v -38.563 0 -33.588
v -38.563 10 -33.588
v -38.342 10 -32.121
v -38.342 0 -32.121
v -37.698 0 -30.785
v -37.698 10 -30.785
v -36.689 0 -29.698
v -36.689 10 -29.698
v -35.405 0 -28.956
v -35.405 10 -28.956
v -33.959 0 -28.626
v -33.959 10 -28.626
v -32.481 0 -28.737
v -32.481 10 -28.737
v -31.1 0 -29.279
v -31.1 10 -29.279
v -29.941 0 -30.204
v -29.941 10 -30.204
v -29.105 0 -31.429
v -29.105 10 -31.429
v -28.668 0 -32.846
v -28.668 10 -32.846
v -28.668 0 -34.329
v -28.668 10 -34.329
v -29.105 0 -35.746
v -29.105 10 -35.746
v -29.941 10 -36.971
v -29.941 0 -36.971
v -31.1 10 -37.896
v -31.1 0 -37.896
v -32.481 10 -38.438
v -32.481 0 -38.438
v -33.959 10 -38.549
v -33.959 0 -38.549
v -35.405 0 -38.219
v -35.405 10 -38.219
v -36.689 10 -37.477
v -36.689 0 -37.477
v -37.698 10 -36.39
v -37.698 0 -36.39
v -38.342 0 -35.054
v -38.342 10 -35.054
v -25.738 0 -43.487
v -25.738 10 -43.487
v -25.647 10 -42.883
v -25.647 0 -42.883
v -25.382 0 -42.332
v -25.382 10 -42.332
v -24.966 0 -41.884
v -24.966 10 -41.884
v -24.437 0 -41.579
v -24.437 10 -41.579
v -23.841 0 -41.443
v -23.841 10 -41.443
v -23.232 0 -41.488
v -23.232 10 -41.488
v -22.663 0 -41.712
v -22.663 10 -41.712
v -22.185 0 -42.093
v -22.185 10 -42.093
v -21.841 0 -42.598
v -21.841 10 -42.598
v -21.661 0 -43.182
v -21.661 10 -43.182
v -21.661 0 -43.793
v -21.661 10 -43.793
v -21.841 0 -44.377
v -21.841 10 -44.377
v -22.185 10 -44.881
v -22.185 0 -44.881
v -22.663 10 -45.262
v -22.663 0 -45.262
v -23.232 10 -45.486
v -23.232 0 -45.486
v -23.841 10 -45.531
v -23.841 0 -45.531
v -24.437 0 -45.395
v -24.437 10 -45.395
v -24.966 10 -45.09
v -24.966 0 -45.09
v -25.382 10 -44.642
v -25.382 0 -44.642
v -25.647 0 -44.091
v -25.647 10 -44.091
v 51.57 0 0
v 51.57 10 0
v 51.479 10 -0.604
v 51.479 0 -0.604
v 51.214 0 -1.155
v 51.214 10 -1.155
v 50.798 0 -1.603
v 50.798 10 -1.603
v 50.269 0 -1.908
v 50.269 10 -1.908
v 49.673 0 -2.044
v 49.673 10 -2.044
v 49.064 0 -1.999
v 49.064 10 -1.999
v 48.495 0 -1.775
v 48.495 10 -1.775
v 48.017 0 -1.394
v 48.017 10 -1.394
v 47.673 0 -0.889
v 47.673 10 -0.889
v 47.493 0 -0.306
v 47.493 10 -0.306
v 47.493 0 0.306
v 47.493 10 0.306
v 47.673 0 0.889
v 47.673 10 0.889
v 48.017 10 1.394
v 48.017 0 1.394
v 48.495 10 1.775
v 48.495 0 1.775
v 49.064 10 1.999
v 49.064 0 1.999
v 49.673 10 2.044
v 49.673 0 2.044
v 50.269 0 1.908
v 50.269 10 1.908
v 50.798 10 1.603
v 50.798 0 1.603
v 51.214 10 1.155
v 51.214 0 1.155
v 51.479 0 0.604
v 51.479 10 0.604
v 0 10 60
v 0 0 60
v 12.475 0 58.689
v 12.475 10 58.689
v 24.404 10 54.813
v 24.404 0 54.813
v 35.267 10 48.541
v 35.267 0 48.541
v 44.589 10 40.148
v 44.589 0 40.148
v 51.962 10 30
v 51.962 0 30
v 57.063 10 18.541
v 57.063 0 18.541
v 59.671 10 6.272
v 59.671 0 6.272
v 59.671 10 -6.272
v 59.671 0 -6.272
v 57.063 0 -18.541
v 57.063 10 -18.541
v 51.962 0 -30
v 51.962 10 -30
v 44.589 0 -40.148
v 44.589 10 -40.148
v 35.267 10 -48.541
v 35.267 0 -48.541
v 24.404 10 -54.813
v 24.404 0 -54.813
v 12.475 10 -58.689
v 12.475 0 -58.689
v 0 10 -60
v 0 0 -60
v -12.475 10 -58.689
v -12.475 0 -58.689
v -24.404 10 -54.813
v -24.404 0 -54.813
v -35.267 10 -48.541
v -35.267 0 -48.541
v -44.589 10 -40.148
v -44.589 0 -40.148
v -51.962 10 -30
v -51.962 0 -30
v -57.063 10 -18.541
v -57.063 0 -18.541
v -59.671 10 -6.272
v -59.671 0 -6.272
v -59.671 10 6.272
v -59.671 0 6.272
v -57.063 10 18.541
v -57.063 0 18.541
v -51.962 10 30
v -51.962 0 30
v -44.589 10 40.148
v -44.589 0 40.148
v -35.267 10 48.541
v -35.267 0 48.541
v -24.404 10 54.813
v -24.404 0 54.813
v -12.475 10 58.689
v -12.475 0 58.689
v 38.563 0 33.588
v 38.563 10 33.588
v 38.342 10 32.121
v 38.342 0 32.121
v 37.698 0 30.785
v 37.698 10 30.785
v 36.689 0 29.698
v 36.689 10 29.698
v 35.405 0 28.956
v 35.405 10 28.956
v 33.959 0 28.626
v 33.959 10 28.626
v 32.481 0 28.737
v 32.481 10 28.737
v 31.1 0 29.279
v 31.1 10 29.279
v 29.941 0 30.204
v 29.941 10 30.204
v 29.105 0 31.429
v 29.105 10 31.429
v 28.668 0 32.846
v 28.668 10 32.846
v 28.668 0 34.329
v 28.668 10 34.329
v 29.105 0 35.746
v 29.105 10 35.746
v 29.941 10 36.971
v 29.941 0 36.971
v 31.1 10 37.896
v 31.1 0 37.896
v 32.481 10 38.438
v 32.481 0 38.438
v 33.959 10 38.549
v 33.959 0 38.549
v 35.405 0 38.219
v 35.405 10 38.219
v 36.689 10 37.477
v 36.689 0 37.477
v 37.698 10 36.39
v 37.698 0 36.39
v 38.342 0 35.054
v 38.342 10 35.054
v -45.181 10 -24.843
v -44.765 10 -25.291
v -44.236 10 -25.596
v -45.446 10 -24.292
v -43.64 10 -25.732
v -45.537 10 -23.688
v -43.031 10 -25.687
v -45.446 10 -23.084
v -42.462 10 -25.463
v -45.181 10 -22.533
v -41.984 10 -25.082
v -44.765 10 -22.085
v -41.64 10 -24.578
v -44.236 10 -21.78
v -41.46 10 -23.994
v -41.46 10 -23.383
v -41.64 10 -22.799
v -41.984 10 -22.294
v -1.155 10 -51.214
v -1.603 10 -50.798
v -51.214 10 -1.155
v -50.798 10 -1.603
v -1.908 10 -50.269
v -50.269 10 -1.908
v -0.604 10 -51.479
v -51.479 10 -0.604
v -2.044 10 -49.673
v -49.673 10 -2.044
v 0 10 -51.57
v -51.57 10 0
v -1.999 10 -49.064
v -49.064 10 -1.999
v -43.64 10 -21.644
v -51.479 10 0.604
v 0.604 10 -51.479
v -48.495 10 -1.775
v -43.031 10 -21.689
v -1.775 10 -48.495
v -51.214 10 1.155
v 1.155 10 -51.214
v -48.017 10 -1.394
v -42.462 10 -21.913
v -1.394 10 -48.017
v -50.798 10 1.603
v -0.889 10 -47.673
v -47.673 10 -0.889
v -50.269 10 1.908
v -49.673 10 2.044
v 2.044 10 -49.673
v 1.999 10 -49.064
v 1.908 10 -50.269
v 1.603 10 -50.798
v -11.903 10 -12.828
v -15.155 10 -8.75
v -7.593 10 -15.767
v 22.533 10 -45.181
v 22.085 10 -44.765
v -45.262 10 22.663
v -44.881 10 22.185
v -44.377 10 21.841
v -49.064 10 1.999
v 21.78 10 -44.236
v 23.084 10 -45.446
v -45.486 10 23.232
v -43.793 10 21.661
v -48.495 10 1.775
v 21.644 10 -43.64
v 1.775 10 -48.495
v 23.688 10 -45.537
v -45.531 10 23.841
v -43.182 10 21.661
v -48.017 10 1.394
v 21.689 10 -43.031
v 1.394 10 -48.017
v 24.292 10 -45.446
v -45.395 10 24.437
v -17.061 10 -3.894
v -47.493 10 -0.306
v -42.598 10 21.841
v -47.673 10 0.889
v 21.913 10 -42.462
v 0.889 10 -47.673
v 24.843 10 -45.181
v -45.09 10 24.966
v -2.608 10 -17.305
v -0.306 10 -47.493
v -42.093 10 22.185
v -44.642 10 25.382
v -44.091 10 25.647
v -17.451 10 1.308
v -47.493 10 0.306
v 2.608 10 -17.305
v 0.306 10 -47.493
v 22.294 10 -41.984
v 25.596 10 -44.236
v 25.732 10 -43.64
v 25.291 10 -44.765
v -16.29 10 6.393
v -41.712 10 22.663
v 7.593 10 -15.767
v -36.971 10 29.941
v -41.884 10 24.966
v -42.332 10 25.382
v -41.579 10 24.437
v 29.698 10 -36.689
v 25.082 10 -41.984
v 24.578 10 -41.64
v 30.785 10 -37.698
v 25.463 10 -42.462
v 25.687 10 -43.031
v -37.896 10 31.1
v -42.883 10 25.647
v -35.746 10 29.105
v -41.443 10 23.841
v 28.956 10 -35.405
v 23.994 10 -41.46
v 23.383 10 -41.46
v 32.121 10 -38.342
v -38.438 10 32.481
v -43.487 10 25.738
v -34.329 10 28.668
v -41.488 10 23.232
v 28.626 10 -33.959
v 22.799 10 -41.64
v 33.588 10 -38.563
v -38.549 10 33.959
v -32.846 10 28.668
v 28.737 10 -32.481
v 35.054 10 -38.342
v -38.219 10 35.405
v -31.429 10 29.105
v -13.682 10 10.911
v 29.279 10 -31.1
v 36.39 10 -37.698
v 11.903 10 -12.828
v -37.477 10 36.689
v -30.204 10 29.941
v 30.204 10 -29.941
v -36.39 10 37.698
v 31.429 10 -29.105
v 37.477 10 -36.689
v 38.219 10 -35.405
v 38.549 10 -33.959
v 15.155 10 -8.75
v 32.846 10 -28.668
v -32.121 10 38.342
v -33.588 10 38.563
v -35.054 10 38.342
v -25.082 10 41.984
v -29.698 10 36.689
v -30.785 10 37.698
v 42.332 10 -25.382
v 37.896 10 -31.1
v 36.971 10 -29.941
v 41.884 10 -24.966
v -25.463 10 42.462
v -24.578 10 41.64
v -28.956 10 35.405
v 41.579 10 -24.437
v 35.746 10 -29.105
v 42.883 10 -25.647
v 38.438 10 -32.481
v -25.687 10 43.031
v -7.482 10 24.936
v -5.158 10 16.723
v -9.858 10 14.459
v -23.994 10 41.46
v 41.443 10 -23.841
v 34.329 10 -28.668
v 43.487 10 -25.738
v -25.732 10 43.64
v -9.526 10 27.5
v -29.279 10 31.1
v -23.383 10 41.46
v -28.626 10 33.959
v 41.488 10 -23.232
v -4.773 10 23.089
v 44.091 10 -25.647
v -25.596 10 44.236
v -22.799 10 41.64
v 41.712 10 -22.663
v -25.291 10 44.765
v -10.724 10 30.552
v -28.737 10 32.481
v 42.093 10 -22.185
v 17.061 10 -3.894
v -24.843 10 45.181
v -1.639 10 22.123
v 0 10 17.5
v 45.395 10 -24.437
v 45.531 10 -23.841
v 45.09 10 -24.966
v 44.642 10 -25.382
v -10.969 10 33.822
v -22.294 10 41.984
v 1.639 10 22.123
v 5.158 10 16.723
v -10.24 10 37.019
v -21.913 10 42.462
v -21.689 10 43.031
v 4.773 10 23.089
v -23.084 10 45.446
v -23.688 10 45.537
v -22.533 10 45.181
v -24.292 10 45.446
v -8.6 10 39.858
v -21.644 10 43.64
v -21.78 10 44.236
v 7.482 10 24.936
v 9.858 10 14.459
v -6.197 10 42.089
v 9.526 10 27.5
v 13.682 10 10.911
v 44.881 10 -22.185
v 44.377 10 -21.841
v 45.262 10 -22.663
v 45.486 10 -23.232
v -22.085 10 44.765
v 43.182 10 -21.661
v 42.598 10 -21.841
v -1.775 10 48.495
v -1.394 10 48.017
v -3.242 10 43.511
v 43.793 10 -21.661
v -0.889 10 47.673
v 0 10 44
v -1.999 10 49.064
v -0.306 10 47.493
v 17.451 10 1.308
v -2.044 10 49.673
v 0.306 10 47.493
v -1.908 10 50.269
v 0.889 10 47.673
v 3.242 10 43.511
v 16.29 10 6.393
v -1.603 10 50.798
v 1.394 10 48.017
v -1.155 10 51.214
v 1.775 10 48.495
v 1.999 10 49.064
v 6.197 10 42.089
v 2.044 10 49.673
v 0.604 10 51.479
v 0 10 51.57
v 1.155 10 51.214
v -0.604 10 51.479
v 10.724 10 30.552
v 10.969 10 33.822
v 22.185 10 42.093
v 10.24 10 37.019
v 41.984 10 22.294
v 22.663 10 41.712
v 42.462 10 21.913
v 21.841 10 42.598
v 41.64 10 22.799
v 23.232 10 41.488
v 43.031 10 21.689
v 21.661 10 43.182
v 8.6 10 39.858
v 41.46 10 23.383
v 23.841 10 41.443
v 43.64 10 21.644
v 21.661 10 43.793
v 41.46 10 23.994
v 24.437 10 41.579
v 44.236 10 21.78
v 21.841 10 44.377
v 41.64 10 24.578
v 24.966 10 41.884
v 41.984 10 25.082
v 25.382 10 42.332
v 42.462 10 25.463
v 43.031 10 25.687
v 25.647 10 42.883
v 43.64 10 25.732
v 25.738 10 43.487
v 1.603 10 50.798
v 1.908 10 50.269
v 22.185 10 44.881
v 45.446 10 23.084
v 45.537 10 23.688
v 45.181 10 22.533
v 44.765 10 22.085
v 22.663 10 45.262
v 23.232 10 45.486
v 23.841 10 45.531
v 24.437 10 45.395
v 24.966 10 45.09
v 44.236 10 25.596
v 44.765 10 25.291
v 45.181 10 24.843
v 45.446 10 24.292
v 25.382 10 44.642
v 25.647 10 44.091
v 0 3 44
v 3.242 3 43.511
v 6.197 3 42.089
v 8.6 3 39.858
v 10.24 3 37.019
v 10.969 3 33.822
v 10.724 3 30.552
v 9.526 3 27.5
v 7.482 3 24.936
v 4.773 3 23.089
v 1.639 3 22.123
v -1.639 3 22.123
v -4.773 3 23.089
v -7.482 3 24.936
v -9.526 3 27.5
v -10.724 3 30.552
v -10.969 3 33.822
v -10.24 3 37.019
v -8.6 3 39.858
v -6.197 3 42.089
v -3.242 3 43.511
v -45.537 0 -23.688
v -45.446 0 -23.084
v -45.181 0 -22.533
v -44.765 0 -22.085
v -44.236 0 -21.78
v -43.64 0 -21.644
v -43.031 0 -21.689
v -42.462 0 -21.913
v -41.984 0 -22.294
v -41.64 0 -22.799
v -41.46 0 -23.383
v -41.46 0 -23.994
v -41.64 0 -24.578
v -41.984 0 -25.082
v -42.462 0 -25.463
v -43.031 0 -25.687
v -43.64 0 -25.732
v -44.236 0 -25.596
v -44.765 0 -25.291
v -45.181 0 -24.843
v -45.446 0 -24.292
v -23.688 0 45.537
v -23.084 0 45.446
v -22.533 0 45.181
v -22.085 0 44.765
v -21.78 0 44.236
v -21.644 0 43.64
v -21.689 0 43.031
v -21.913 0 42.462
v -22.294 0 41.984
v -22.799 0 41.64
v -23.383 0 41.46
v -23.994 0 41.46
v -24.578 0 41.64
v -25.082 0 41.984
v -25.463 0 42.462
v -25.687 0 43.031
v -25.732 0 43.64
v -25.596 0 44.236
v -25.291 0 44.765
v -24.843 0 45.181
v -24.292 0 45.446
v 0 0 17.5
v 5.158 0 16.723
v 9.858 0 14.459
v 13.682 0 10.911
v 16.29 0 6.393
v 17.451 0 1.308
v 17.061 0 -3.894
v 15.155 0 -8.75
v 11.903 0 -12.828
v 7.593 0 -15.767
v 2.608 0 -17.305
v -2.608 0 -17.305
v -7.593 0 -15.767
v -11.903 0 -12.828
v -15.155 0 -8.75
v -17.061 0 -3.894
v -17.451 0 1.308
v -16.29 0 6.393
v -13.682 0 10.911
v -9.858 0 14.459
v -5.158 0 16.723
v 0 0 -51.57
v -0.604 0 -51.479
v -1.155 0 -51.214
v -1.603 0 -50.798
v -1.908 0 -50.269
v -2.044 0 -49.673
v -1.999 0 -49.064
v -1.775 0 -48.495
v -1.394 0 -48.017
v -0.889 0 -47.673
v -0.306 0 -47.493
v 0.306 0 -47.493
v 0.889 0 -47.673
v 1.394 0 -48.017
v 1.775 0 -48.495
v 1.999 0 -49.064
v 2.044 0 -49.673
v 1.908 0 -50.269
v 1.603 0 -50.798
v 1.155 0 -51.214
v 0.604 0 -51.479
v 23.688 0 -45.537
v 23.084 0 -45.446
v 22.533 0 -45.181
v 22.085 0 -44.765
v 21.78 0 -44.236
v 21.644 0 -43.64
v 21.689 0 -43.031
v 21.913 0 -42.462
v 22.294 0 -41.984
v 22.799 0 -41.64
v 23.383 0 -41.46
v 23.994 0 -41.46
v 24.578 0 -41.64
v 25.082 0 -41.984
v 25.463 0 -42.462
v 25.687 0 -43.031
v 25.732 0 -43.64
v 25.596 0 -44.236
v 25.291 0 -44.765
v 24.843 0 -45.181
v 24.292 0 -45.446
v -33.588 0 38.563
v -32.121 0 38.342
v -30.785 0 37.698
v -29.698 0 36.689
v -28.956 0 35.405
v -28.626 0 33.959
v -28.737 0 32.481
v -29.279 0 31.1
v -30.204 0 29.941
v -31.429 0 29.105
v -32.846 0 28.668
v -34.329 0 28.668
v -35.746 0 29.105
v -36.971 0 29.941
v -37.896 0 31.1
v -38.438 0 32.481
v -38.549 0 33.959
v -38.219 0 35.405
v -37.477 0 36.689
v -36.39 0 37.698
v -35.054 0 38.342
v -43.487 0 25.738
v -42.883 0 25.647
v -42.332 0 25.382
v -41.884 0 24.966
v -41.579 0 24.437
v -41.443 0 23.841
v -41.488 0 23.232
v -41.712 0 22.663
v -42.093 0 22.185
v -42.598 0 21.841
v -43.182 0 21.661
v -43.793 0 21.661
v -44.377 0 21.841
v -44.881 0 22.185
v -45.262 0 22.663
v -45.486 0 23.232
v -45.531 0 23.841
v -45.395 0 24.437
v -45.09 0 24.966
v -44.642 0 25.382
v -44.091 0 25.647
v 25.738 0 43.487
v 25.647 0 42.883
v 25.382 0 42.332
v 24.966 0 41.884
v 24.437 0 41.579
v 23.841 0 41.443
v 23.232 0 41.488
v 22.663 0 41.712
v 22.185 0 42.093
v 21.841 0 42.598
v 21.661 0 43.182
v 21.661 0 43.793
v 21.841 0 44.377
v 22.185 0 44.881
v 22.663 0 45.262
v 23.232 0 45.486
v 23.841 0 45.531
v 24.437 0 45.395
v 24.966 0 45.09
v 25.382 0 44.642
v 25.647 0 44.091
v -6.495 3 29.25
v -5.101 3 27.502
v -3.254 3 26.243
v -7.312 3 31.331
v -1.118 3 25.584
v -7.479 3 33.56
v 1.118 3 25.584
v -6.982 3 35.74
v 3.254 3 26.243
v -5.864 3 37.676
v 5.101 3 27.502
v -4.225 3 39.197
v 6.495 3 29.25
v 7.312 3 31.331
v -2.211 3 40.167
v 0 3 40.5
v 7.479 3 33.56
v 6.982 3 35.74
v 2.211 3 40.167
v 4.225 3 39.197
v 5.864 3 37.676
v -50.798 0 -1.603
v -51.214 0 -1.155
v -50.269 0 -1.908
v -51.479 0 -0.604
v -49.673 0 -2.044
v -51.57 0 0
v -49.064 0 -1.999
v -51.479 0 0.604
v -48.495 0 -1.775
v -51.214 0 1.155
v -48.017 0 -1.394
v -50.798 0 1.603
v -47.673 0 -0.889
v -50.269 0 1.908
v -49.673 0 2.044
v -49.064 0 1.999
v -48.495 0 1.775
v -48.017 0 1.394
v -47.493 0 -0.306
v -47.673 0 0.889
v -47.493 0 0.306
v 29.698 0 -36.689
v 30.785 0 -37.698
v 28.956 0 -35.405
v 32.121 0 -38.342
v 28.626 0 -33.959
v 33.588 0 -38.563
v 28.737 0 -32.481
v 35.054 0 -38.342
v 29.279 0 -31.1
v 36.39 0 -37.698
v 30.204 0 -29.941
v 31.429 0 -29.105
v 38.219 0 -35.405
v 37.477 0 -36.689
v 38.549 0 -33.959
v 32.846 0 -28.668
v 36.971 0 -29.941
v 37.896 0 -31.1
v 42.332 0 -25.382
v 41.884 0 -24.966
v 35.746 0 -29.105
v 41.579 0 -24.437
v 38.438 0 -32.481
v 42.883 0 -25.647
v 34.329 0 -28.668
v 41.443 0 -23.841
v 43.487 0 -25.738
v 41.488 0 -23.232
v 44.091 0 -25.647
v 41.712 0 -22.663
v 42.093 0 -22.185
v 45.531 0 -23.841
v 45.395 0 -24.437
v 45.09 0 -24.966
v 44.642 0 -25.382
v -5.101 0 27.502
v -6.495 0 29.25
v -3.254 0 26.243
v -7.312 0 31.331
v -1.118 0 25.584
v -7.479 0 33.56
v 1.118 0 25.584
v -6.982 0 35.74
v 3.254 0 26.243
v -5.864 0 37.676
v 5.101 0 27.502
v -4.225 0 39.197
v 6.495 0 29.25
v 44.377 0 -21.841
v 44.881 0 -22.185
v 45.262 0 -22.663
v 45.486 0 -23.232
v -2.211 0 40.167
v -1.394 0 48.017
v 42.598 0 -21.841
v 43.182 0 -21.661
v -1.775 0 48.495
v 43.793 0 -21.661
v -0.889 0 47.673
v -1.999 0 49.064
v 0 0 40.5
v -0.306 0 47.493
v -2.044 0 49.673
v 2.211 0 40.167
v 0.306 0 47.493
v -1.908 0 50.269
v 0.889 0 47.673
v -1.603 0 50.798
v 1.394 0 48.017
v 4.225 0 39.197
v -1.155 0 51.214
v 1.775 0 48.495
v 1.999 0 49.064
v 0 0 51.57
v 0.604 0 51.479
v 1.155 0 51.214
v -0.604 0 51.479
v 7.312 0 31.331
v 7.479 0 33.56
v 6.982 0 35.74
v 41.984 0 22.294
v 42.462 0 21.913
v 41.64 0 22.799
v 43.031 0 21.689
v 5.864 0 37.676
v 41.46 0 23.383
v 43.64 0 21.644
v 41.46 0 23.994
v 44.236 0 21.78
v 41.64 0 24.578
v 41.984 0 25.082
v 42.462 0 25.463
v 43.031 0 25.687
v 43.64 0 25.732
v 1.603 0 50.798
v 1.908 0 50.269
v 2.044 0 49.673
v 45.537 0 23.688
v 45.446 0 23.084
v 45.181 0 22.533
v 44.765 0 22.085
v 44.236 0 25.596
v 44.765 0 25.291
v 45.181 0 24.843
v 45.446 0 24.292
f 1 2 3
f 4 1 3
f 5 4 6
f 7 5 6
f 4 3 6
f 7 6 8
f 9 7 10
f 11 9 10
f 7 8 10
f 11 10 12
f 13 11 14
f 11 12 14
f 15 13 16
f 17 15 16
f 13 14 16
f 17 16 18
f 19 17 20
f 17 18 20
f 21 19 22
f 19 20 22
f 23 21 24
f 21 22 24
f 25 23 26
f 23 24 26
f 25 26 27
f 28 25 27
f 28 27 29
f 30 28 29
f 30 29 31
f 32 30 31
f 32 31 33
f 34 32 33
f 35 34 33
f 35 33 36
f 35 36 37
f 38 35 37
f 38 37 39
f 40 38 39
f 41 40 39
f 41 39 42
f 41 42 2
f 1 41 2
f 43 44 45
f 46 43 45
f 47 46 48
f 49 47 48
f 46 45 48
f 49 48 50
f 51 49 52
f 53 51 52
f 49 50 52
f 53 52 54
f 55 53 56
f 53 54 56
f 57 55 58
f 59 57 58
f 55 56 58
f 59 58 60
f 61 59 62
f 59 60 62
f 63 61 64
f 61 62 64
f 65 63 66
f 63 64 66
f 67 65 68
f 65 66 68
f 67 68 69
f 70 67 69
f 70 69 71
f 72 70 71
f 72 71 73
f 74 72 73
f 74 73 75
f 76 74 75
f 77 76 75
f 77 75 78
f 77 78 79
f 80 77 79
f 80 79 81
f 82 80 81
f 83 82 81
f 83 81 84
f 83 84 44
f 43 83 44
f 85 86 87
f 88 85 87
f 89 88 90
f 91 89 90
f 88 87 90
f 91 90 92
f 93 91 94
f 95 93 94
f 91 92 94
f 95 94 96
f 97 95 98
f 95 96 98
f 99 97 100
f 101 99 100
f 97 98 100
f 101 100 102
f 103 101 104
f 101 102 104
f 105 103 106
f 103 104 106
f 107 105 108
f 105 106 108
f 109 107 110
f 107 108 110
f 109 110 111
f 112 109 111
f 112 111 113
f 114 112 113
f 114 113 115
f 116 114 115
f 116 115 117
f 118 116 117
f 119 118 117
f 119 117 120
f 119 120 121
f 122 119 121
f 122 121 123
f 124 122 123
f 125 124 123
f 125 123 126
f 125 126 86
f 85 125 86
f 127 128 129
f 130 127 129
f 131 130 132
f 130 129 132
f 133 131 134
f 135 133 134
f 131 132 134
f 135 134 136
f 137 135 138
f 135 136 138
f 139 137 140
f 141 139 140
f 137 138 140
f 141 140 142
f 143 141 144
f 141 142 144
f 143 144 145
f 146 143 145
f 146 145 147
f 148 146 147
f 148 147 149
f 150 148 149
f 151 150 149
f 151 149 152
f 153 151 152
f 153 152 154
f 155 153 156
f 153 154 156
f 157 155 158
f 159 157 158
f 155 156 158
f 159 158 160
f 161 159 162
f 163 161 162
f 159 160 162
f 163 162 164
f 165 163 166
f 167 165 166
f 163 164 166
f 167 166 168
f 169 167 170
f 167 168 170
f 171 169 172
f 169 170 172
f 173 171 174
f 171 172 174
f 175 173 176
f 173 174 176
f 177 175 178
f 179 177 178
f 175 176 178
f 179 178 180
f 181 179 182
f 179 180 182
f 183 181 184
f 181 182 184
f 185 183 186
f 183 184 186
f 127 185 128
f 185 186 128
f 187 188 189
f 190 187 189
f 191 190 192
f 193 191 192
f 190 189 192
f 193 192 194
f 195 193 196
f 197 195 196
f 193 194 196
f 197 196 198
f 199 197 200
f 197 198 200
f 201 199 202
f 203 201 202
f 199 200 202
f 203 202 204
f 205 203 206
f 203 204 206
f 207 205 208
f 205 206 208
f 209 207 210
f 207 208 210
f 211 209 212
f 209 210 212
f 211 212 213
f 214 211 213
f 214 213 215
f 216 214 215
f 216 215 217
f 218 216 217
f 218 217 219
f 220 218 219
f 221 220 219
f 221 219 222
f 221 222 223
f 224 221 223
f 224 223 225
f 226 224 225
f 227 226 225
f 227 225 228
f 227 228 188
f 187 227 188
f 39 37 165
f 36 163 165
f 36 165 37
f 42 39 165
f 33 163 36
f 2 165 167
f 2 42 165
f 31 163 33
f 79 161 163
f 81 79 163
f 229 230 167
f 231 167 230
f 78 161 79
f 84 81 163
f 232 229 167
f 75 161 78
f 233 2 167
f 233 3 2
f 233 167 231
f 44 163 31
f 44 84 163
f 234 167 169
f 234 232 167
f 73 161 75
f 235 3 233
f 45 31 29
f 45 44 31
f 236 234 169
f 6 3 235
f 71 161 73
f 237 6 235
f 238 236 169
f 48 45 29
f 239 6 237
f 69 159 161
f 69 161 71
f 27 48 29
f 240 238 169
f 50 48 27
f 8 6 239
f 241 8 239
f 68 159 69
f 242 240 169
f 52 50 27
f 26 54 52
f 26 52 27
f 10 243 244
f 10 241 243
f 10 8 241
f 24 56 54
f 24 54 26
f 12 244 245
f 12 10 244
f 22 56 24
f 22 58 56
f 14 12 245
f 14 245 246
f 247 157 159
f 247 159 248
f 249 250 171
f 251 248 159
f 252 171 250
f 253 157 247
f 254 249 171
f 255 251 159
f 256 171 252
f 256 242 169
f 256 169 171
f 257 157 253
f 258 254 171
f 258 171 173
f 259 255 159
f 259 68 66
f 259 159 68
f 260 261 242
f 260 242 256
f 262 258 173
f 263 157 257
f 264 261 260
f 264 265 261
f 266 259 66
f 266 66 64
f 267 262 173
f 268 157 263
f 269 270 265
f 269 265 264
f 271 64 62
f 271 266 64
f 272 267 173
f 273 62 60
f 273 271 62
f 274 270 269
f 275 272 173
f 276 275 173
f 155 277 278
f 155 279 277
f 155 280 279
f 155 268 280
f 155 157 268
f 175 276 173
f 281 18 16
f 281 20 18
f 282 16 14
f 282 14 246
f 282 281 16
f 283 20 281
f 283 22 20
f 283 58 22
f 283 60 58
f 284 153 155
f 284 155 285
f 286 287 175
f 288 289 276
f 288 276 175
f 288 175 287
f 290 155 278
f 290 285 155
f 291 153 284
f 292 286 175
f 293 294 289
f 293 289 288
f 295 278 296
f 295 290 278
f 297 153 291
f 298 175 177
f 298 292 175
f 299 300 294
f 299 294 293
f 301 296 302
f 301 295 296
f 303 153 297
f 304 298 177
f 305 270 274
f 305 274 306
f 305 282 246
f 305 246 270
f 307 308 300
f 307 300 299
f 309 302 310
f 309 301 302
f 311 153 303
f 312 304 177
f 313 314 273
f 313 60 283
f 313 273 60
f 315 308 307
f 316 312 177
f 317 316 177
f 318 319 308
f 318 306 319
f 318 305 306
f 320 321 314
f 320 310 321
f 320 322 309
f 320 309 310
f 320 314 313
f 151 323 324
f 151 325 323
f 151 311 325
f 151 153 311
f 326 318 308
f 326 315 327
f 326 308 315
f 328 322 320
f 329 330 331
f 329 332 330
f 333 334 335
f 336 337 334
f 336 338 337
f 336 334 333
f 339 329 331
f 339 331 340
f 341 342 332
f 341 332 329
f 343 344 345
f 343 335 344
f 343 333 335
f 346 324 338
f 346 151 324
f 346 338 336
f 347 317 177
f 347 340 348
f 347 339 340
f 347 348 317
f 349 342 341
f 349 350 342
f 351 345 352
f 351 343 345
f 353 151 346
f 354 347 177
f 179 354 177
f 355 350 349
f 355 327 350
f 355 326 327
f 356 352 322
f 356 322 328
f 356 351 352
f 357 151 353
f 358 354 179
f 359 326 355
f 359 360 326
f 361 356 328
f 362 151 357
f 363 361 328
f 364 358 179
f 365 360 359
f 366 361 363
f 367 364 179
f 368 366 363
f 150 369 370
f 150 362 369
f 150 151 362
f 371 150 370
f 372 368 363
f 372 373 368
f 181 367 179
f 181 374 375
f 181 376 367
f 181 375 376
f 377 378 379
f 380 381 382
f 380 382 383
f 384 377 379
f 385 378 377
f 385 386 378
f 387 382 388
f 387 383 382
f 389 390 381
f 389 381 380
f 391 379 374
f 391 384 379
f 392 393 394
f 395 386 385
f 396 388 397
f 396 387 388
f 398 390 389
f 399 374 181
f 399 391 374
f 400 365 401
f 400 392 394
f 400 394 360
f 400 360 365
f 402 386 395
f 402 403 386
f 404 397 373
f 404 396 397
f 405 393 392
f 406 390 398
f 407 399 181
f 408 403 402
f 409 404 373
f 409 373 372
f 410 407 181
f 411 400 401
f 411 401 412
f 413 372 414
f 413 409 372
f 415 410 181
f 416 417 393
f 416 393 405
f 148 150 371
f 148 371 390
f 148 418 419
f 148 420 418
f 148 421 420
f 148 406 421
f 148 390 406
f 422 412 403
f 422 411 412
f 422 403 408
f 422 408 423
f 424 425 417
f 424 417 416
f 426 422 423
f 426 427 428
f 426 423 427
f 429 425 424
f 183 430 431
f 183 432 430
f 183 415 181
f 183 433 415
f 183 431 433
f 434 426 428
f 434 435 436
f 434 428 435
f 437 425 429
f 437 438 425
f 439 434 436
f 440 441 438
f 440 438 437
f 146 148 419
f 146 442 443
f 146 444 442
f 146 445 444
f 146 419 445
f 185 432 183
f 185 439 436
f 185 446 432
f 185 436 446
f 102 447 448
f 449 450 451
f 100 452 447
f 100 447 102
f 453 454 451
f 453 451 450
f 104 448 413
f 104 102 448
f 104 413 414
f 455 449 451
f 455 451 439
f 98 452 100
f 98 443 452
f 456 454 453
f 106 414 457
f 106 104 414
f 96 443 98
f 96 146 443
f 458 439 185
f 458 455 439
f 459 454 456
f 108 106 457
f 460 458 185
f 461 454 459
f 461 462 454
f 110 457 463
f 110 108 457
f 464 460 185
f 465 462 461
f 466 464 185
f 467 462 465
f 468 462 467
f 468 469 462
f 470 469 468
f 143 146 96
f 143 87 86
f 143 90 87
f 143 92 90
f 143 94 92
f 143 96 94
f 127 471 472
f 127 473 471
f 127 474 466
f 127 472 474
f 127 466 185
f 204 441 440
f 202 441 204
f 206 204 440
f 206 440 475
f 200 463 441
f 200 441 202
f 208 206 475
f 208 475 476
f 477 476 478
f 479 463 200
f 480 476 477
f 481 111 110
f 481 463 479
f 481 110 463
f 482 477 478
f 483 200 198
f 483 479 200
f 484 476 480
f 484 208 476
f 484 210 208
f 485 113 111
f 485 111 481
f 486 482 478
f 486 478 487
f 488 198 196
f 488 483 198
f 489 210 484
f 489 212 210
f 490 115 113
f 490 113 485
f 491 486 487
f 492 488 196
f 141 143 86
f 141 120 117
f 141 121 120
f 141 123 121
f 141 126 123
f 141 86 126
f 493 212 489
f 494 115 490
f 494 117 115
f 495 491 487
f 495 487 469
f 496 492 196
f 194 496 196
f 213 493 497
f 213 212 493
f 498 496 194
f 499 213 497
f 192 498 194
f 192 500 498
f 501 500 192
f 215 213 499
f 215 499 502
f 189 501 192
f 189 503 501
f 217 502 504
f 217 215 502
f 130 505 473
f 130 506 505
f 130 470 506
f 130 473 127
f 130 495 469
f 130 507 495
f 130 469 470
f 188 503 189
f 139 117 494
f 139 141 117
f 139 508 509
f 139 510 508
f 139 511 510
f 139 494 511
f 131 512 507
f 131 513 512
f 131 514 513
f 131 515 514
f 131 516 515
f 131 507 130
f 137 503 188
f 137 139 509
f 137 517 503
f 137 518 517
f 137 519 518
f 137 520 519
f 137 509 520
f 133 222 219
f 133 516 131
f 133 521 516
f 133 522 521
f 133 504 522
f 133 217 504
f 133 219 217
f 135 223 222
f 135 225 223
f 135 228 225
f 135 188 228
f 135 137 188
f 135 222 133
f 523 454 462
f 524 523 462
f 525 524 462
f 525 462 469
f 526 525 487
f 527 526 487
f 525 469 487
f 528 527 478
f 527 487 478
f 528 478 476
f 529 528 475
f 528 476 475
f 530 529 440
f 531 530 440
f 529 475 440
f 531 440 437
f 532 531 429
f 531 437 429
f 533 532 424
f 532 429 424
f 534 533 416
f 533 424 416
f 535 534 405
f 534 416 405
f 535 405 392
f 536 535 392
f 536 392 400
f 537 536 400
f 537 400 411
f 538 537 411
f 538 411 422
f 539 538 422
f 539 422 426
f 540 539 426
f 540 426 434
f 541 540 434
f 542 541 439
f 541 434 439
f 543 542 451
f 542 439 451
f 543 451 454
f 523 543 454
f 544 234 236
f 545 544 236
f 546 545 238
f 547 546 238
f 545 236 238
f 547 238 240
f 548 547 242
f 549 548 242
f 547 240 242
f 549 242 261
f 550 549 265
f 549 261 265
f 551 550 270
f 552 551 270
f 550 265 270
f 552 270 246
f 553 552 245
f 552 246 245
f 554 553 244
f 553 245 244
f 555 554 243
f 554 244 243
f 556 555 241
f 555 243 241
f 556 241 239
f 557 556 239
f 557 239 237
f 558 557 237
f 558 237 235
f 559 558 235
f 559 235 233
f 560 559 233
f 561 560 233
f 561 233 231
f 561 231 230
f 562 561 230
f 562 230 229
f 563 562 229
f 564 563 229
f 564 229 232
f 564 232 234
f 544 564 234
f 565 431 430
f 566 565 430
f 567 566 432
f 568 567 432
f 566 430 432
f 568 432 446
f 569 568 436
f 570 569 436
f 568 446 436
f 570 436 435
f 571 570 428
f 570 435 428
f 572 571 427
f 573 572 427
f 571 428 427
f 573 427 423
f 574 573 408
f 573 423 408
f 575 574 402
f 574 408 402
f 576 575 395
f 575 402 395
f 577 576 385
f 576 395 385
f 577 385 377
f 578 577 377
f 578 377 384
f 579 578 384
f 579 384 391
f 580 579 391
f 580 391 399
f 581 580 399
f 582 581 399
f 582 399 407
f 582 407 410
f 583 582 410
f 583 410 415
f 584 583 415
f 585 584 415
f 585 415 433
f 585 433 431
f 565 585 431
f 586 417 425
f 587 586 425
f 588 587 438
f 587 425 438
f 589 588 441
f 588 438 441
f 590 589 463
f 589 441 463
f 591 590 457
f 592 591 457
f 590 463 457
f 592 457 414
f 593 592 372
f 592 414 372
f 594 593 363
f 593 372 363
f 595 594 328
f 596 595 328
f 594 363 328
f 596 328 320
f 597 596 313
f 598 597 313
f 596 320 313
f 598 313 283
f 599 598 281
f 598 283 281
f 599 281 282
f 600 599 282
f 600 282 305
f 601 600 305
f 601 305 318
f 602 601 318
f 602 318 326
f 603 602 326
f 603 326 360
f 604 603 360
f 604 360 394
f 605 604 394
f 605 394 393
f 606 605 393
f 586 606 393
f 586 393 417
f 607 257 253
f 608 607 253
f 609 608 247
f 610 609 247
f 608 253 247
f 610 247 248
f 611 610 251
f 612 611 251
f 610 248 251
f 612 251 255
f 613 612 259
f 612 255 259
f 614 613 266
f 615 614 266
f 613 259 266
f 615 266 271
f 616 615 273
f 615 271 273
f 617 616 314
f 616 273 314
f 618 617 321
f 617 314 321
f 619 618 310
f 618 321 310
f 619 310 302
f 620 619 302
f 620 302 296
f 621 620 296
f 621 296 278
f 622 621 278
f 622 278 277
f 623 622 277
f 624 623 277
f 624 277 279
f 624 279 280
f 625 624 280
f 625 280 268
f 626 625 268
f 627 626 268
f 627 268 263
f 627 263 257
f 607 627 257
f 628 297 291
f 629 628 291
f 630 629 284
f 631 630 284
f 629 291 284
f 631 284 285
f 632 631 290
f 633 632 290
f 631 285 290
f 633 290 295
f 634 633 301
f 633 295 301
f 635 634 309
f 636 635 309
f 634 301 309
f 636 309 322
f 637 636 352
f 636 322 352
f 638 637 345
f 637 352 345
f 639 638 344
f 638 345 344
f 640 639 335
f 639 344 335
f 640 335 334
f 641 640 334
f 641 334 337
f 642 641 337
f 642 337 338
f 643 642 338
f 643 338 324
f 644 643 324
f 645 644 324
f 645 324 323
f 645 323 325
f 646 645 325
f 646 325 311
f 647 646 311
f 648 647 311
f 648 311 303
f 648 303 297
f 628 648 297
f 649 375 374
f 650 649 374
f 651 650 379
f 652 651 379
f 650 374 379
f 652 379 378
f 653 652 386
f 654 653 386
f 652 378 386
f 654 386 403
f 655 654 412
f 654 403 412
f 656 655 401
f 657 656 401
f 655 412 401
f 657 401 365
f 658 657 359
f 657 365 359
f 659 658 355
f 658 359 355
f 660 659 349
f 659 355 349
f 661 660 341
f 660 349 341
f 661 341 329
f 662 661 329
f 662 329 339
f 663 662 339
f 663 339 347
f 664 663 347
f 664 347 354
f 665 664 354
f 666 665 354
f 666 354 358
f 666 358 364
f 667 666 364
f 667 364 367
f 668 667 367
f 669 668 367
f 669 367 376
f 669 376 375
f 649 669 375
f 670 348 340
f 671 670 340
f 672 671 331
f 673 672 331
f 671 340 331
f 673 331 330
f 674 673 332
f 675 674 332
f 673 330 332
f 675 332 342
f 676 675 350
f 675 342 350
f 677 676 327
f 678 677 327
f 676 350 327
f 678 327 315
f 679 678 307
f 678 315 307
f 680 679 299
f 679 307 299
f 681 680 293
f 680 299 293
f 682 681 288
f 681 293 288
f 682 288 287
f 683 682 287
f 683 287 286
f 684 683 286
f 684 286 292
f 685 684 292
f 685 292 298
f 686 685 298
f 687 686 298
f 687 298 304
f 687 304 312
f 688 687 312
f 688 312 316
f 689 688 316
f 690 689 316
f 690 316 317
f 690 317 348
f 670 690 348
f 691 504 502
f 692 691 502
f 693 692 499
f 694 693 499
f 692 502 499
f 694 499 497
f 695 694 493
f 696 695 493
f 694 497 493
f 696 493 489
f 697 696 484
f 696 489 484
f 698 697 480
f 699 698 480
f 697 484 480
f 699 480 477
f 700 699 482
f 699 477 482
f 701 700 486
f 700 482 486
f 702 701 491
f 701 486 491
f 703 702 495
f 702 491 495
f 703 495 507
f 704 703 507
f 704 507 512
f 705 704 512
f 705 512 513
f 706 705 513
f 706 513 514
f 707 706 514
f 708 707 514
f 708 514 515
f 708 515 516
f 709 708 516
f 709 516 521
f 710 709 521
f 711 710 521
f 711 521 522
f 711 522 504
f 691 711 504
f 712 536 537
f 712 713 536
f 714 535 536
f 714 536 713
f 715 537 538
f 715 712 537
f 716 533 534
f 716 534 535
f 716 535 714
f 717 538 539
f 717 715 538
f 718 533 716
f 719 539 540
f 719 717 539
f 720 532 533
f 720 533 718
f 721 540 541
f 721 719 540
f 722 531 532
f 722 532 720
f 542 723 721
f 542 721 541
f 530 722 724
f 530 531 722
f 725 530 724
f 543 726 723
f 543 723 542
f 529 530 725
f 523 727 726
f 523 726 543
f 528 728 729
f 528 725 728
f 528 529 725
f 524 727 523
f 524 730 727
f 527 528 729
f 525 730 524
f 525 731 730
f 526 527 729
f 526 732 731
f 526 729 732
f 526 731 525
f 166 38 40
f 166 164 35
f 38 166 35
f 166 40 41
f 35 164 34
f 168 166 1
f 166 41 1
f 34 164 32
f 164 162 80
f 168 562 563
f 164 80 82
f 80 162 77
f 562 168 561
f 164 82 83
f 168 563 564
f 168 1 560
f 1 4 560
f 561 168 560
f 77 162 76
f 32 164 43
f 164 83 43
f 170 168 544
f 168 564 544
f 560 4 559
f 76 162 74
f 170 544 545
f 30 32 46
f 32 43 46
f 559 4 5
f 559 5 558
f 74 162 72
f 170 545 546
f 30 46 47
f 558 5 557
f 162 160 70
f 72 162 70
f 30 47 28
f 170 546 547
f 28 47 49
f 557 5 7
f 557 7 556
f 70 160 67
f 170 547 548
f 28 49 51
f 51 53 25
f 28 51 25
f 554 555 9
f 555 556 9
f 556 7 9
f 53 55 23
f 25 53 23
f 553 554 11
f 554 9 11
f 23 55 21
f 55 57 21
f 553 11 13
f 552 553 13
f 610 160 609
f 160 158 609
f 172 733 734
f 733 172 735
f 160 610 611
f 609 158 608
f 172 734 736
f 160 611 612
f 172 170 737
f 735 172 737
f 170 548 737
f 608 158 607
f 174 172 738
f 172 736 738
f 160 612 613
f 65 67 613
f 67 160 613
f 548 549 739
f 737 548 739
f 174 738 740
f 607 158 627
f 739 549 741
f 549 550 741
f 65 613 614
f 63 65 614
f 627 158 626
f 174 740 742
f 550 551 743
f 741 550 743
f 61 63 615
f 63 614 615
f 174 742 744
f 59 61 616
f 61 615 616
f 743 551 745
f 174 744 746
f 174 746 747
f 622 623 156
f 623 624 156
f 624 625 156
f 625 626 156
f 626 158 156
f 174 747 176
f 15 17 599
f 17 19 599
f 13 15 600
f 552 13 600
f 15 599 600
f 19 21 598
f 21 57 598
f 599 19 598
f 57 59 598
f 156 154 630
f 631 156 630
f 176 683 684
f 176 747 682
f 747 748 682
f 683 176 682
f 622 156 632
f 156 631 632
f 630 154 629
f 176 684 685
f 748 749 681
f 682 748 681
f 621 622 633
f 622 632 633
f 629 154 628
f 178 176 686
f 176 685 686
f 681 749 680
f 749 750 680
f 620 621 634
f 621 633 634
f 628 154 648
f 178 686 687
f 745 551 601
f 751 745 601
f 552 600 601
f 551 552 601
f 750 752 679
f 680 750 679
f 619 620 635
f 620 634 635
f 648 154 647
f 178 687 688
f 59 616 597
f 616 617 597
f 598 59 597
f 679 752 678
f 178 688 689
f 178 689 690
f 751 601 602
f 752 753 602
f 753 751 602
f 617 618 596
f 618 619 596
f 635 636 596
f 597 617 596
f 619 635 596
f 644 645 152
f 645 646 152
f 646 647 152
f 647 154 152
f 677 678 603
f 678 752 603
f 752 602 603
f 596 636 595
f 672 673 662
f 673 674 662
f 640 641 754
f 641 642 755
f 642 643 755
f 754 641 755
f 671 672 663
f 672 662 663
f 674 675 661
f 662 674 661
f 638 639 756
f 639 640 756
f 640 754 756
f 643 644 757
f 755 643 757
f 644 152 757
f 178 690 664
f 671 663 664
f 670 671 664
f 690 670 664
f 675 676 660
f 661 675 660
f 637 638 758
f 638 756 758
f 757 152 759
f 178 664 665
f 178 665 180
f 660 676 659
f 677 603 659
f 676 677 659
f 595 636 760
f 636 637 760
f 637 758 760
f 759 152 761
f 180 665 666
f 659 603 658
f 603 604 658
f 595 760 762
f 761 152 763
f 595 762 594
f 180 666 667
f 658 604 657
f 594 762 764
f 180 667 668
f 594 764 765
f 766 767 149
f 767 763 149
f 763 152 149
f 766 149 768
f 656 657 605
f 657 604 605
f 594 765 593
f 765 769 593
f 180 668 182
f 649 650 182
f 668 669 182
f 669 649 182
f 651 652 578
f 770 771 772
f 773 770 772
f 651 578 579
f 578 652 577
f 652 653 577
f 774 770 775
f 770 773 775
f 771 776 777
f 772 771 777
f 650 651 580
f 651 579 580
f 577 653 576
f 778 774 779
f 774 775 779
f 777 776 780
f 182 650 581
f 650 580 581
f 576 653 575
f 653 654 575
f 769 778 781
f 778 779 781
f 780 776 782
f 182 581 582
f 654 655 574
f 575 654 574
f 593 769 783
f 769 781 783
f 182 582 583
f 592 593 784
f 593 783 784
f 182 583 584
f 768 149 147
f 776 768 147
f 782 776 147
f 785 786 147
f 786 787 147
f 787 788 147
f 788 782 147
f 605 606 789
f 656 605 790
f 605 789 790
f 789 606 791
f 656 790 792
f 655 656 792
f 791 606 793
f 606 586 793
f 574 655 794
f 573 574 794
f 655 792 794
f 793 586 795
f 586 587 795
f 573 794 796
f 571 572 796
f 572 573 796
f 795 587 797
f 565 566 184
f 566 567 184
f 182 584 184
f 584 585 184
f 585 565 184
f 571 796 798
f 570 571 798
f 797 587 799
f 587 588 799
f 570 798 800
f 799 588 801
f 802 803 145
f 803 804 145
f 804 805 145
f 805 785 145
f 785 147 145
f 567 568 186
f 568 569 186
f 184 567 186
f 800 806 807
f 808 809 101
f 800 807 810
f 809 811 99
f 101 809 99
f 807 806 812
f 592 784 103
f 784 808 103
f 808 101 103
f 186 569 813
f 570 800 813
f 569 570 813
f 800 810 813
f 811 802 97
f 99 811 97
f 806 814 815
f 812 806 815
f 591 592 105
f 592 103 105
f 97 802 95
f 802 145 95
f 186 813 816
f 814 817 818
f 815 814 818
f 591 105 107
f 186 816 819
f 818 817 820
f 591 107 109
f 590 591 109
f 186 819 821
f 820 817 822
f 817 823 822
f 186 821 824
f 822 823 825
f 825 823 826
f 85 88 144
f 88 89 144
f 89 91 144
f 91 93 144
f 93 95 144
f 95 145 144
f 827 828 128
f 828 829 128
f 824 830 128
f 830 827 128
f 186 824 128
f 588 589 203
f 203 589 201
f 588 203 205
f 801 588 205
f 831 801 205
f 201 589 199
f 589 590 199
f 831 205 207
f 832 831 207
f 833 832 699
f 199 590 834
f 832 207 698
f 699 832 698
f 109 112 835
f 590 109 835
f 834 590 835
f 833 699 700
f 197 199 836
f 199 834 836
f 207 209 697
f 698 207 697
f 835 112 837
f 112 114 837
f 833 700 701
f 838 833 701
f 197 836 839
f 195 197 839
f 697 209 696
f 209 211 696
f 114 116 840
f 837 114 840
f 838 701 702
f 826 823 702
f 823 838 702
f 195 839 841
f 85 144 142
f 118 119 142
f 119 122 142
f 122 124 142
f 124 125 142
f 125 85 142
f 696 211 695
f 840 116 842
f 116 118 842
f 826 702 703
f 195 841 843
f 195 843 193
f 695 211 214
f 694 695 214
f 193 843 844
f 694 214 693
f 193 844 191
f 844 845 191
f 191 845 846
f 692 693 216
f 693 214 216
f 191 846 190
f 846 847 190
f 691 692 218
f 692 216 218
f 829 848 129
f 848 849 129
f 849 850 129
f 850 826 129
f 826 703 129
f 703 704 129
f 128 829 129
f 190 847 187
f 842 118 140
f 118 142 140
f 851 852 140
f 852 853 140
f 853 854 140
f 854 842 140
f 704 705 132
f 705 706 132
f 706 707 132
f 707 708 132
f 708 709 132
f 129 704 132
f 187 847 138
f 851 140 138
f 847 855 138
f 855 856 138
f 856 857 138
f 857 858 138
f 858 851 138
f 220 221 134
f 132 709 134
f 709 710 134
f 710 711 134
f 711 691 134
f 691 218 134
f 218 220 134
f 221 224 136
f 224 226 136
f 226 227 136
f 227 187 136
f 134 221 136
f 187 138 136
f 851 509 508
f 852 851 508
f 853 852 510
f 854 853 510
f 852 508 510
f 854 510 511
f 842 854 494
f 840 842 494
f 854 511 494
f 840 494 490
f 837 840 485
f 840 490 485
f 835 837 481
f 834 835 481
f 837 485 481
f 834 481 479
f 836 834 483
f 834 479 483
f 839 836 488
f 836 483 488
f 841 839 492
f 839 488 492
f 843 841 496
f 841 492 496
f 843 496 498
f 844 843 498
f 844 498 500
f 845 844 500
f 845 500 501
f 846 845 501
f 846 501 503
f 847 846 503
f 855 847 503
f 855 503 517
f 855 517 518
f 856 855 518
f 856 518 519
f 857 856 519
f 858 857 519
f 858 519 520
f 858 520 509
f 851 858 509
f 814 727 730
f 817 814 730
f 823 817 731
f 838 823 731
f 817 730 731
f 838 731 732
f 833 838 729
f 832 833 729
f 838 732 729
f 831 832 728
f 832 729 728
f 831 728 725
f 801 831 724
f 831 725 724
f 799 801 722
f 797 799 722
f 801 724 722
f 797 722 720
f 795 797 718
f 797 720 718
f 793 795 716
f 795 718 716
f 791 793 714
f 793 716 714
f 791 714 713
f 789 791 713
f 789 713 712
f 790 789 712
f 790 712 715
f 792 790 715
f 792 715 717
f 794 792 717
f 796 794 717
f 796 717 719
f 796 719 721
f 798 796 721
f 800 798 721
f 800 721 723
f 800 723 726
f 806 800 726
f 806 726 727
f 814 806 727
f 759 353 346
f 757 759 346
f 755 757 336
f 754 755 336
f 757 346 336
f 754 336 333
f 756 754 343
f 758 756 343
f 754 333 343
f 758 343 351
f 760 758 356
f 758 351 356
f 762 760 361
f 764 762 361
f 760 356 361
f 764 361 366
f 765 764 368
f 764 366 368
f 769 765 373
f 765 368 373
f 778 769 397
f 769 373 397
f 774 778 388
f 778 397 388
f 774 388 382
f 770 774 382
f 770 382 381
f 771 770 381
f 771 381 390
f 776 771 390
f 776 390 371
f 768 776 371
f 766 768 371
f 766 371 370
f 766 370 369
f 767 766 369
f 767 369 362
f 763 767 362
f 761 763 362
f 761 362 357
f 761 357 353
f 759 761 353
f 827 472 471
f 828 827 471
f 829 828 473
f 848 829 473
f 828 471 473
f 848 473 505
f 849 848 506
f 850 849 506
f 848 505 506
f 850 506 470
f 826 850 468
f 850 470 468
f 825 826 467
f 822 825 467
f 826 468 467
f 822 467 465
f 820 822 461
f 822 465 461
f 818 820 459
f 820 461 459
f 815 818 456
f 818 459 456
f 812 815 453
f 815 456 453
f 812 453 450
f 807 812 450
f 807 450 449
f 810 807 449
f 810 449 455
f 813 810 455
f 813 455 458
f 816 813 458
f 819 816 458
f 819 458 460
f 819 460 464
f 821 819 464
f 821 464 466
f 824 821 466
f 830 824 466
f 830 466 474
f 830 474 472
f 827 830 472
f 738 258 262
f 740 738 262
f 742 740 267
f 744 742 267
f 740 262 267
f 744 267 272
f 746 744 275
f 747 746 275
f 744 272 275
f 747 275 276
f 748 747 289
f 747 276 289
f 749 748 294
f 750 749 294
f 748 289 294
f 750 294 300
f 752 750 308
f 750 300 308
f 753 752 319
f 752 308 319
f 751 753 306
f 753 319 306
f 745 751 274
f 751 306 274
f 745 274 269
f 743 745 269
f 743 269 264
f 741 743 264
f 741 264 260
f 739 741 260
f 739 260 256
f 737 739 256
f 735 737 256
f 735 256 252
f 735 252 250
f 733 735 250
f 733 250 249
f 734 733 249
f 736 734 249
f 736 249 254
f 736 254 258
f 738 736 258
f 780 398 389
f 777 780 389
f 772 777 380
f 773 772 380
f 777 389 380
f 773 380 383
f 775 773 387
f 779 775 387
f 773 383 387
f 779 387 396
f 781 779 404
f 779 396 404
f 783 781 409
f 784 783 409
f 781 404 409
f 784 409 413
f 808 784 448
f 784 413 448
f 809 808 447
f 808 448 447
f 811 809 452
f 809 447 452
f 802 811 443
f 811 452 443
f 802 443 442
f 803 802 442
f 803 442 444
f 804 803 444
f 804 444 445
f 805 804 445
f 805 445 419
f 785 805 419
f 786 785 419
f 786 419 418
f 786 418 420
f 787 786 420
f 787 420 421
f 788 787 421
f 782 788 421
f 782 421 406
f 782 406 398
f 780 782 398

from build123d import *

# Parameters (mm, degrees)
SKETCH1_R           = 60
BOSS_EXTRUDE1_DEPTH = 10
SKETCH2_R           = 11
CUT_EXTRUDE1_DEPTH  = 7
SKETCH3_R           = 7.5
CUT_EXTRUDE2_DEPTH  = 86.141059425
SKETCH5_R           = 4.975
SKETCH5_R_2         = 2.05
CUT_EXTRUDE4_DEPTH  = 86.440037453
SKETCH6_R           = 2.05
CUT_EXTRUDE5_DEPTH  = 86.440037453
CIRPATTERN1_COUNT   = 4
SKETCH7_R           = 17.5
CUT_EXTRUDE6_DEPTH  = 86.440037453


with BuildPart() as part:
    # Sketch1 → Boss-Extrude1 (new body)
    with BuildSketch(Plane(origin=(0, 0, 0), x_dir=(1, 0, 0), z_dir=(0, 1, 0))):
        with Locations(Location((0, 0, 0), (0, 0, 270))):
            Circle(SKETCH1_R)
    extrude(amount=BOSS_EXTRUDE1_DEPTH)

    # Sketch2 → Cut-Extrude1 (cut)
    with BuildSketch(Plane(origin=(0, 10, 0), x_dir=(1, 0, 0), z_dir=(0, 1, 0))):
        with Locations(Location((0, -33, 0), (0, 0, 270))):
            Circle(SKETCH2_R)
    extrude(amount=-CUT_EXTRUDE1_DEPTH, mode=Mode.SUBTRACT)

    # Sketch3 → Cut-Extrude2 (cut, through all)
    with BuildSketch(Plane(origin=(0, 3, 0), x_dir=(1, 0, 0), z_dir=(0, 1, 0))):
        with Locations(Location((0, -33, 0), (0, 0, 270))):
            Circle(SKETCH3_R)
    extrude(amount=-CUT_EXTRUDE2_DEPTH, mode=Mode.SUBTRACT)

    # Sketch5 → Cut-Extrude4 (cut, through all)
    with BuildSketch(Plane(origin=(0, 10, 0), x_dir=(1, 0, 0), z_dir=(0, 1, 0))):
        with Locations(Location((-33.587572106, -33.587572106, 0), (0, 0, 270))):
            Circle(SKETCH5_R)
        with Locations(Location((-43.487067043, -23.68807717, 0), (0, 0, 270))):
            Circle(SKETCH5_R_2)
        with Locations(Location((-23.68807717, -43.487067043, 0), (0, 0, 270))):
            Circle(SKETCH5_R_2)
    cut_extrude4 = extrude(amount=-CUT_EXTRUDE4_DEPTH, mode=Mode.SUBTRACT)

    # Sketch6 → Cut-Extrude5 (cut, through all)
    with BuildSketch(Plane(origin=(0, 10, 0), x_dir=(1, 0, 0), z_dir=(0, 1, 0))):
        with Locations(Location((0, -49.52, 0), (0, 0, 270))):
            Circle(SKETCH6_R)
    cut_extrude5 = extrude(amount=-CUT_EXTRUDE5_DEPTH, mode=Mode.SUBTRACT)

    # CirPattern1: Cut-Extrude4, Cut-Extrude5 ×4 about axis
    cirpattern1_axis = Axis((0, 0, 0), (0, 1, 0))
    add([cut_extrude4.rotate(cirpattern1_axis, i * 360 / CIRPATTERN1_COUNT) for i in range(1, CIRPATTERN1_COUNT)], mode=Mode.SUBTRACT)
    add([cut_extrude5.rotate(cirpattern1_axis, i * 360 / CIRPATTERN1_COUNT) for i in range(1, CIRPATTERN1_COUNT)], mode=Mode.SUBTRACT)

    # Sketch7 → Cut-Extrude6 (cut, through all)
    with BuildSketch(Plane(origin=(0, 10, 0), x_dir=(1, 0, 0), z_dir=(0, 1, 0))):
        with Locations(Location((0, 0, 0), (0, 0, 270))):
            Circle(SKETCH7_R)
    extrude(amount=-CUT_EXTRUDE6_DEPTH, mode=Mode.SUBTRACT)


solid = part.part
